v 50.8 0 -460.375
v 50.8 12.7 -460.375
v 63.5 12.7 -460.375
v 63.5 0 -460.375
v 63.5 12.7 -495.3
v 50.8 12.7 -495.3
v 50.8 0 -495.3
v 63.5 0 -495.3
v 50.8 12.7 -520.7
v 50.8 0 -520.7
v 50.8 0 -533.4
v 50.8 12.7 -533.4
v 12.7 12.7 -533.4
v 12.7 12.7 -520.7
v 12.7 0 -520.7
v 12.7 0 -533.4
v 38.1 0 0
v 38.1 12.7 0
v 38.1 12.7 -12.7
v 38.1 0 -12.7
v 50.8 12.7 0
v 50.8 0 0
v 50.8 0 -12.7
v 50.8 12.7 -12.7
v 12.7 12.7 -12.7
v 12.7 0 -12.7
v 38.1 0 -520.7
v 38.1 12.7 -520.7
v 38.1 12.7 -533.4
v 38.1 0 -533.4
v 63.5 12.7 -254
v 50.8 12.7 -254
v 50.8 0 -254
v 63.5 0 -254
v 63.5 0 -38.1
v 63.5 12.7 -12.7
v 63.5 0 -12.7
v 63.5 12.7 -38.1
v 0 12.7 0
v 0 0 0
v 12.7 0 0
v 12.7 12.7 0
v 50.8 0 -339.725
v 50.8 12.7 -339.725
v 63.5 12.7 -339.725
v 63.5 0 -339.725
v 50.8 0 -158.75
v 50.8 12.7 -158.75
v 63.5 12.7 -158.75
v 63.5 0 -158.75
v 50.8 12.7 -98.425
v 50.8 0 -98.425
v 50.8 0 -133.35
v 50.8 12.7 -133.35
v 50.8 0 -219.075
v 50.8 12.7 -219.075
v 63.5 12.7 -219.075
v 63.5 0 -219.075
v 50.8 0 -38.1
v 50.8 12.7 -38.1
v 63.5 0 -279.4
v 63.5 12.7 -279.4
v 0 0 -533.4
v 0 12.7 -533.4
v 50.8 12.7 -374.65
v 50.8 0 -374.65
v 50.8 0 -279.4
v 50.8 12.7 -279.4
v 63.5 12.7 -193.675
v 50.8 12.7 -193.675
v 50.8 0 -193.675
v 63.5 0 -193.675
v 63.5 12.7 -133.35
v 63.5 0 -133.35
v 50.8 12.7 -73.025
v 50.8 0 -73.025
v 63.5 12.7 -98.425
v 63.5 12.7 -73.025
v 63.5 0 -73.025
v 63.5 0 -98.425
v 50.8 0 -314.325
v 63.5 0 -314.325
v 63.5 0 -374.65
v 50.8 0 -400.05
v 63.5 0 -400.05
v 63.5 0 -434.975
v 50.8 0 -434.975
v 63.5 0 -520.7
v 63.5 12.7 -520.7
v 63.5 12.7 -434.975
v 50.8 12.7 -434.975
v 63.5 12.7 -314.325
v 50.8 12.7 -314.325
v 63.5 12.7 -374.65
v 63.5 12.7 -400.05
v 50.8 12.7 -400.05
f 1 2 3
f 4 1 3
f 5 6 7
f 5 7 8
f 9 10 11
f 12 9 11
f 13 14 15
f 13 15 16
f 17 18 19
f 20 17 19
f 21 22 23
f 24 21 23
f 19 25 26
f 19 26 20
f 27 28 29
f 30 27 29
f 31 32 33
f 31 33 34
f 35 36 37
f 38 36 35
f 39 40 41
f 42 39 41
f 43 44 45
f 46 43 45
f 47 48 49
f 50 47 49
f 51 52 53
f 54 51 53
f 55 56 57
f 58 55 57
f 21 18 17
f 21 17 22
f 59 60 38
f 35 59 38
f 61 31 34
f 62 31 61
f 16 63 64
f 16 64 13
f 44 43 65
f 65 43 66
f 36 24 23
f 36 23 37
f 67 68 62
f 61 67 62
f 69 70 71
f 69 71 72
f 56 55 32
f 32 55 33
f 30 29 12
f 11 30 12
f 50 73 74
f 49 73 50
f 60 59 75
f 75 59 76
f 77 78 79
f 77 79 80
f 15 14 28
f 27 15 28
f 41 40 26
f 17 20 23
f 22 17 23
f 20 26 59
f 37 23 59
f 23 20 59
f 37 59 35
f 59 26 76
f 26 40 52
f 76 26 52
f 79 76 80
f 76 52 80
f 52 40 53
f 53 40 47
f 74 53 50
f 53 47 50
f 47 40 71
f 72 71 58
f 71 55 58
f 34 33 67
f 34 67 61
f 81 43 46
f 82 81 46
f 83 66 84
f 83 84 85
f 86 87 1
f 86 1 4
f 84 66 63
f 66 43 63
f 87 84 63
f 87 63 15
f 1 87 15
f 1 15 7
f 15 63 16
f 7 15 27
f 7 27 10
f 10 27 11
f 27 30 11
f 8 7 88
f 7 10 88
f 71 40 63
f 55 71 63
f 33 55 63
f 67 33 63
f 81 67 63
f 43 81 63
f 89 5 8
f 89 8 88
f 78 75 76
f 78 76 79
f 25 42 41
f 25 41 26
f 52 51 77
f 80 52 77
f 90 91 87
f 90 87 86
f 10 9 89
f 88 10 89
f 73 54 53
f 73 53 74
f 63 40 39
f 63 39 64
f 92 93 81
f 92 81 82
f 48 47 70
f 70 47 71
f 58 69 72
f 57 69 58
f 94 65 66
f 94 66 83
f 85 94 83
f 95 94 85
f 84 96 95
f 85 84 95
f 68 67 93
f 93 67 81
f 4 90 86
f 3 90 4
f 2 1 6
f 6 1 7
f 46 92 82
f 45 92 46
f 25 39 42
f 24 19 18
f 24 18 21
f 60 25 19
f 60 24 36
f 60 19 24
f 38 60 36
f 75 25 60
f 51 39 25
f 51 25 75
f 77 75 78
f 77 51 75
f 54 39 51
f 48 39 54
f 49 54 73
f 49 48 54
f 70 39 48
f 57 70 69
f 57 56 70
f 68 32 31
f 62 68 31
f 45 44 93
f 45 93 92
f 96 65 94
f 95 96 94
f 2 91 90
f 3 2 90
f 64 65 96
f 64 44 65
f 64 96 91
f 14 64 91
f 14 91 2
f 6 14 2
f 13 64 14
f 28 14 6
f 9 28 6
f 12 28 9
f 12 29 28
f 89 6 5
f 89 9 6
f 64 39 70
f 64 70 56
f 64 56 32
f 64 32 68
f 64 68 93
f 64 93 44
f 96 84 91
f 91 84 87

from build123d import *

# Parameters (mm, degrees)
SKETCH1_W           = 50.8
SKETCH1_H           = 533.4
BOSS_EXTRUDE1_DEPTH = 12.7
SKETCH2_W           = 12.7
SKETCH2_H           = 25.4
BOSS_EXTRUDE2_DEPTH = 12.7
SKETCH7_W           = 25.4
SKETCH7_H           = 12.7
CUT_EXTRUDE3_DEPTH  = 538.316573353


with BuildPart() as part:
    # Sketch1 → Boss-Extrude1 (new body)
    with BuildSketch(Plane(origin=(0, 0, 0), x_dir=(1, 0, 0), z_dir=(0, 1, 0))):
        with Locations((25.4, 266.7)):
            Rectangle(SKETCH1_W, SKETCH1_H)
    extrude(amount=BOSS_EXTRUDE1_DEPTH)

    # Sketch2 → Boss-Extrude2 (add, through all)
    with BuildSketch(Plane(origin=(0, 12.7, 0), x_dir=(1, 0, 0), z_dir=(0, 1, 0))):
        with Locations((57.15, 508)):
            Rectangle(SKETCH2_W, SKETCH2_H)
        with Locations((57.15, 447.675)):
            Rectangle(SKETCH2_W, SKETCH2_H)
        with Locations((57.15, 387.35)):
            Rectangle(SKETCH2_W, SKETCH2_H)
        with Locations((57.15, 327.025)):
            Rectangle(SKETCH2_W, SKETCH2_H)
        with Locations((57.15, 266.7)):
            Rectangle(SKETCH2_W, SKETCH2_H)
        with Locations((57.15, 206.375)):
            Rectangle(SKETCH2_W, SKETCH2_H)
        with Locations((57.15, 146.05)):
            Rectangle(SKETCH2_W, SKETCH2_H)
        with Locations((57.15, 85.725)):
            Rectangle(SKETCH2_W, SKETCH2_H)
        with Locations((57.15, 25.4)):
            Rectangle(SKETCH2_W, SKETCH2_H)
    extrude(amount=-BOSS_EXTRUDE2_DEPTH)

    # Sketch7 → Cut-Extrude3 (cut, through all)
    with BuildSketch(Plane(origin=(0, 12.7, 0), x_dir=(1, 0, 0), z_dir=(0, 1, 0))):
        with Locations((25.4, 6.35)):
            Rectangle(SKETCH7_W, SKETCH7_H)
        with Locations((25.4, 527.05)):
            Rectangle(SKETCH7_W, SKETCH7_H)
    extrude(amount=-CUT_EXTRUDE3_DEPTH, mode=Mode.SUBTRACT)


solid = part.part
